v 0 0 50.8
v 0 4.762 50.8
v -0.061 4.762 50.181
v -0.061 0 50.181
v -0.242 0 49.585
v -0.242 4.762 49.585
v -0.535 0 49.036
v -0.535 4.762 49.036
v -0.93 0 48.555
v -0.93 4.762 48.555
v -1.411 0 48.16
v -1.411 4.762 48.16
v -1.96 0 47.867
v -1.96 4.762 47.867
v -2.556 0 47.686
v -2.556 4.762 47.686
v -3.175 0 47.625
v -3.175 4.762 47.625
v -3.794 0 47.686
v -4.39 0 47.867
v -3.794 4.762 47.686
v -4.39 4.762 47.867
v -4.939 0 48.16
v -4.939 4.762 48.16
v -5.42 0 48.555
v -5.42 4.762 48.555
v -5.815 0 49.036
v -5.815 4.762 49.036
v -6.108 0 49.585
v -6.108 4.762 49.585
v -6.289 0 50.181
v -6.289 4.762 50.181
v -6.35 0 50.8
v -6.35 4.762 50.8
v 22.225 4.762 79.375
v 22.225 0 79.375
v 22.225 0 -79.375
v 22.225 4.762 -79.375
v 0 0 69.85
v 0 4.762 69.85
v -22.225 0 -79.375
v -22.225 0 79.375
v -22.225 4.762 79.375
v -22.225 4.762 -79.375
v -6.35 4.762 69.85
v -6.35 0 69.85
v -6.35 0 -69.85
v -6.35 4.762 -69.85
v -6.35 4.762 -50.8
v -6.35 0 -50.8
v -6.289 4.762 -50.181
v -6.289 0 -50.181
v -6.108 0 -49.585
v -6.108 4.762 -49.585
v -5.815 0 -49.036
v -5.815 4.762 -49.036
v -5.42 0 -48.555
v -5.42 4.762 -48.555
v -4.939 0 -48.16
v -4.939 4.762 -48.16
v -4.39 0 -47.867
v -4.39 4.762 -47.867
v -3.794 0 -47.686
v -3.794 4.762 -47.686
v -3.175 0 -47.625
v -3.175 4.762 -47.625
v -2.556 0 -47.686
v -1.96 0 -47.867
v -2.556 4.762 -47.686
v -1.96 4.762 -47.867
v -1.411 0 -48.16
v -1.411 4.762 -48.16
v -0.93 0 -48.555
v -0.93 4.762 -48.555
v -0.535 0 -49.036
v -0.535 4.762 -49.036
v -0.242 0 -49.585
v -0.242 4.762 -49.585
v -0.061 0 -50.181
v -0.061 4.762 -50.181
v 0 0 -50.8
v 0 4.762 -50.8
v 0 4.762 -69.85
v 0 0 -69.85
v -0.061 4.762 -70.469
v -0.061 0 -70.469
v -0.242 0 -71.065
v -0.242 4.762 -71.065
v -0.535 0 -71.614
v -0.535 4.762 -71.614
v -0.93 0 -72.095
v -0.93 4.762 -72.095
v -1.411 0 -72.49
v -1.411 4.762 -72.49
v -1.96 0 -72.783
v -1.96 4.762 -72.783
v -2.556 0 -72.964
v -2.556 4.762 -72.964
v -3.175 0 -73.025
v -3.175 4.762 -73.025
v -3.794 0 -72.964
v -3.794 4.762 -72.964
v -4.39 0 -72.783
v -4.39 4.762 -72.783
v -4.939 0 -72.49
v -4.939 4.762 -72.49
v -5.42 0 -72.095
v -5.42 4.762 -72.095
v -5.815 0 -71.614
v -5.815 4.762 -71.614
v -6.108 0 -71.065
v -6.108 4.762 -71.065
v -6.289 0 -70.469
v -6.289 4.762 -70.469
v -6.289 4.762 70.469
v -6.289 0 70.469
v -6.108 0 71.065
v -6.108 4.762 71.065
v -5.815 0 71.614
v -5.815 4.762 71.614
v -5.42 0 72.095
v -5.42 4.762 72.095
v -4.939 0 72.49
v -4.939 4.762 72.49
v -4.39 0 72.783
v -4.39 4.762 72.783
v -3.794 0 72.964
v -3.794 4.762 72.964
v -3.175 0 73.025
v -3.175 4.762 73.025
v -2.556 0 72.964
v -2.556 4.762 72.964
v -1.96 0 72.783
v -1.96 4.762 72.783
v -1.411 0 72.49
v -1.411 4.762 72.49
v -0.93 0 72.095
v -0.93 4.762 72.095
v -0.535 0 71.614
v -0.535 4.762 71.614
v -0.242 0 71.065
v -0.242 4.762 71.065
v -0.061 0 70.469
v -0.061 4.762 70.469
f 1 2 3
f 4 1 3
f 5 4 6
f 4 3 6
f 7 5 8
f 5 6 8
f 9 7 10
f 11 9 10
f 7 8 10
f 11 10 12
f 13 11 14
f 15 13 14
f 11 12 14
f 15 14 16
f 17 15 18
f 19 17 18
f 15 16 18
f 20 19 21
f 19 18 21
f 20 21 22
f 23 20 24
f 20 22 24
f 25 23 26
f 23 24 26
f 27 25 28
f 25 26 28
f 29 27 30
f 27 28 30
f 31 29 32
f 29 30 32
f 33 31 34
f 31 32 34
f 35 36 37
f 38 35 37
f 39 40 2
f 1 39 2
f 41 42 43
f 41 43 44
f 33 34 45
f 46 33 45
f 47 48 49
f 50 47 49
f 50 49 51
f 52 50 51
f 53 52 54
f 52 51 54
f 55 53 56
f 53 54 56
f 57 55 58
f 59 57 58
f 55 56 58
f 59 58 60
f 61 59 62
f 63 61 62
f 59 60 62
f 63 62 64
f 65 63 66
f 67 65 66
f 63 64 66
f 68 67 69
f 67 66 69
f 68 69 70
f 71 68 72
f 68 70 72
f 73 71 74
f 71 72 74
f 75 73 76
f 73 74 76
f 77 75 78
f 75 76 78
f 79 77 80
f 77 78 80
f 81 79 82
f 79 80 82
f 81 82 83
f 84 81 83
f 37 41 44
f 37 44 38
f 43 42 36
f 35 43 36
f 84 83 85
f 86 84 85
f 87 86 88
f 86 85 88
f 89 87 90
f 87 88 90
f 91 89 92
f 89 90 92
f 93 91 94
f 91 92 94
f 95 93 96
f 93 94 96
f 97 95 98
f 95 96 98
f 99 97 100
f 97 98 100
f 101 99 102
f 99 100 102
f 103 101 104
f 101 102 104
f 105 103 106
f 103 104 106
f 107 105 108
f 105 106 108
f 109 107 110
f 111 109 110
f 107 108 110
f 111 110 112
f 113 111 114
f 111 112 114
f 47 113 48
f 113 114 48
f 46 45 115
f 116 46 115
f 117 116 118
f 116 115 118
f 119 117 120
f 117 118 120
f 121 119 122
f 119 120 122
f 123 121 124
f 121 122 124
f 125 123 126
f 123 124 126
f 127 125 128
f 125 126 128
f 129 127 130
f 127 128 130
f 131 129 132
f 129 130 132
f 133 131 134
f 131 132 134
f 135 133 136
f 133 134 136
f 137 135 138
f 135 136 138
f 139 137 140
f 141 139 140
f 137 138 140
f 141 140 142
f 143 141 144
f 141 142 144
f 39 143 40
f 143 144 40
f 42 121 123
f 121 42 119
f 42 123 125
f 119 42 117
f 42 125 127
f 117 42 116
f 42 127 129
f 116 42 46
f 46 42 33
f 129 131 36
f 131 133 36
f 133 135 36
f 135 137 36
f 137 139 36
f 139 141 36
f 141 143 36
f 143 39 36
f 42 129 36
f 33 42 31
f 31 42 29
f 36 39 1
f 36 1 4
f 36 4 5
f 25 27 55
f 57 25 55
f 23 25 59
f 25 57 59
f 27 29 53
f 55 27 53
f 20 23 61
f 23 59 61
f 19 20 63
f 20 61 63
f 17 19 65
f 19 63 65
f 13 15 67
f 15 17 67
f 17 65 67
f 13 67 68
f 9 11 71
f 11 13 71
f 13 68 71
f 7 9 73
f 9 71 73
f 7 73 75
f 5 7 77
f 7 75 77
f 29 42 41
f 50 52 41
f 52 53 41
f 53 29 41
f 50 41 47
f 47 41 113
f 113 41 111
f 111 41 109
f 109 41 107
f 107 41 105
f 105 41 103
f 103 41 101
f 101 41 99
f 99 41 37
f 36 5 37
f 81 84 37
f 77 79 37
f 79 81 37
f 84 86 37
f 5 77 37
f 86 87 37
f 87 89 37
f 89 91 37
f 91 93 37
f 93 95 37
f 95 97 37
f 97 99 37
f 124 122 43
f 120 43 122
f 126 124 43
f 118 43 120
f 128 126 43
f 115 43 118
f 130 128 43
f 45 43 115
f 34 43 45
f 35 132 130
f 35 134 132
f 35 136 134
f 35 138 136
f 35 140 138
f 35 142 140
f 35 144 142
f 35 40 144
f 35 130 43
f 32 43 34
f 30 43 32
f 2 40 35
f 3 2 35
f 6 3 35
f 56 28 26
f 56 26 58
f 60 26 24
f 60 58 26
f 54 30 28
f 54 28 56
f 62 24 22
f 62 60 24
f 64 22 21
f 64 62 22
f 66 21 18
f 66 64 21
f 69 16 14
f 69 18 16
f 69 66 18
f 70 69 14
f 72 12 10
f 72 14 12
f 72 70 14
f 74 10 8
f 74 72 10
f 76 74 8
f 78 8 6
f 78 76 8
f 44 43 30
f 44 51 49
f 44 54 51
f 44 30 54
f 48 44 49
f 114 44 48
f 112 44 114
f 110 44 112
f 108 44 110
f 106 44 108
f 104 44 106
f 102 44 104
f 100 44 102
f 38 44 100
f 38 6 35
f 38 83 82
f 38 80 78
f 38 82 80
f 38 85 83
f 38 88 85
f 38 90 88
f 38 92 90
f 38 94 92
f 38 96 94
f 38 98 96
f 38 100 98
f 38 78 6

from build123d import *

# Parameters (mm, degrees)
SKETCH1_W           = 44.45
SKETCH1_H           = 158.75
BOSS_EXTRUDE1_DEPTH = 4.7625
CUT_EXTRUDE1_DEPTH  = 5.7625


with BuildPart() as part:
    # Sketch1 → Boss-Extrude1 (new body)
    with BuildSketch(Plane(origin=(0, 0, 0), x_dir=(1, 0, 0), z_dir=(0, 1, 0))):
        Rectangle(SKETCH1_W, SKETCH1_H)
    extrude(amount=BOSS_EXTRUDE1_DEPTH)

    # Sketch2 → Cut-Extrude1 (cut, through all)
    with BuildSketch(Plane(origin=(0, 4.7625, 0), x_dir=(1, 0, 0), z_dir=(0, 1, 0))):
        with BuildLine():
            Line((0, 50.8), (0, 69.85))
            ThreePointArc((0, 69.85), (-3.175, 73.025), (-6.35, 69.85))
            Line((-6.35, 69.85), (-6.35, 50.8))
            ThreePointArc((-6.35, 50.8), (-3.175, 47.625), (0, 50.8))
        make_face()
        with BuildLine():
            Line((-6.35, -50.8), (-6.35, -69.85))
            ThreePointArc((-6.35, -69.85), (-3.175, -73.025), (0, -69.85))
            Line((0, -69.85), (0, -50.8))
            ThreePointArc((0, -50.8), (-3.175, -47.625), (-6.35, -50.8))
        make_face()
    extrude(amount=-CUT_EXTRUDE1_DEPTH, mode=Mode.SUBTRACT)


solid = part.part
